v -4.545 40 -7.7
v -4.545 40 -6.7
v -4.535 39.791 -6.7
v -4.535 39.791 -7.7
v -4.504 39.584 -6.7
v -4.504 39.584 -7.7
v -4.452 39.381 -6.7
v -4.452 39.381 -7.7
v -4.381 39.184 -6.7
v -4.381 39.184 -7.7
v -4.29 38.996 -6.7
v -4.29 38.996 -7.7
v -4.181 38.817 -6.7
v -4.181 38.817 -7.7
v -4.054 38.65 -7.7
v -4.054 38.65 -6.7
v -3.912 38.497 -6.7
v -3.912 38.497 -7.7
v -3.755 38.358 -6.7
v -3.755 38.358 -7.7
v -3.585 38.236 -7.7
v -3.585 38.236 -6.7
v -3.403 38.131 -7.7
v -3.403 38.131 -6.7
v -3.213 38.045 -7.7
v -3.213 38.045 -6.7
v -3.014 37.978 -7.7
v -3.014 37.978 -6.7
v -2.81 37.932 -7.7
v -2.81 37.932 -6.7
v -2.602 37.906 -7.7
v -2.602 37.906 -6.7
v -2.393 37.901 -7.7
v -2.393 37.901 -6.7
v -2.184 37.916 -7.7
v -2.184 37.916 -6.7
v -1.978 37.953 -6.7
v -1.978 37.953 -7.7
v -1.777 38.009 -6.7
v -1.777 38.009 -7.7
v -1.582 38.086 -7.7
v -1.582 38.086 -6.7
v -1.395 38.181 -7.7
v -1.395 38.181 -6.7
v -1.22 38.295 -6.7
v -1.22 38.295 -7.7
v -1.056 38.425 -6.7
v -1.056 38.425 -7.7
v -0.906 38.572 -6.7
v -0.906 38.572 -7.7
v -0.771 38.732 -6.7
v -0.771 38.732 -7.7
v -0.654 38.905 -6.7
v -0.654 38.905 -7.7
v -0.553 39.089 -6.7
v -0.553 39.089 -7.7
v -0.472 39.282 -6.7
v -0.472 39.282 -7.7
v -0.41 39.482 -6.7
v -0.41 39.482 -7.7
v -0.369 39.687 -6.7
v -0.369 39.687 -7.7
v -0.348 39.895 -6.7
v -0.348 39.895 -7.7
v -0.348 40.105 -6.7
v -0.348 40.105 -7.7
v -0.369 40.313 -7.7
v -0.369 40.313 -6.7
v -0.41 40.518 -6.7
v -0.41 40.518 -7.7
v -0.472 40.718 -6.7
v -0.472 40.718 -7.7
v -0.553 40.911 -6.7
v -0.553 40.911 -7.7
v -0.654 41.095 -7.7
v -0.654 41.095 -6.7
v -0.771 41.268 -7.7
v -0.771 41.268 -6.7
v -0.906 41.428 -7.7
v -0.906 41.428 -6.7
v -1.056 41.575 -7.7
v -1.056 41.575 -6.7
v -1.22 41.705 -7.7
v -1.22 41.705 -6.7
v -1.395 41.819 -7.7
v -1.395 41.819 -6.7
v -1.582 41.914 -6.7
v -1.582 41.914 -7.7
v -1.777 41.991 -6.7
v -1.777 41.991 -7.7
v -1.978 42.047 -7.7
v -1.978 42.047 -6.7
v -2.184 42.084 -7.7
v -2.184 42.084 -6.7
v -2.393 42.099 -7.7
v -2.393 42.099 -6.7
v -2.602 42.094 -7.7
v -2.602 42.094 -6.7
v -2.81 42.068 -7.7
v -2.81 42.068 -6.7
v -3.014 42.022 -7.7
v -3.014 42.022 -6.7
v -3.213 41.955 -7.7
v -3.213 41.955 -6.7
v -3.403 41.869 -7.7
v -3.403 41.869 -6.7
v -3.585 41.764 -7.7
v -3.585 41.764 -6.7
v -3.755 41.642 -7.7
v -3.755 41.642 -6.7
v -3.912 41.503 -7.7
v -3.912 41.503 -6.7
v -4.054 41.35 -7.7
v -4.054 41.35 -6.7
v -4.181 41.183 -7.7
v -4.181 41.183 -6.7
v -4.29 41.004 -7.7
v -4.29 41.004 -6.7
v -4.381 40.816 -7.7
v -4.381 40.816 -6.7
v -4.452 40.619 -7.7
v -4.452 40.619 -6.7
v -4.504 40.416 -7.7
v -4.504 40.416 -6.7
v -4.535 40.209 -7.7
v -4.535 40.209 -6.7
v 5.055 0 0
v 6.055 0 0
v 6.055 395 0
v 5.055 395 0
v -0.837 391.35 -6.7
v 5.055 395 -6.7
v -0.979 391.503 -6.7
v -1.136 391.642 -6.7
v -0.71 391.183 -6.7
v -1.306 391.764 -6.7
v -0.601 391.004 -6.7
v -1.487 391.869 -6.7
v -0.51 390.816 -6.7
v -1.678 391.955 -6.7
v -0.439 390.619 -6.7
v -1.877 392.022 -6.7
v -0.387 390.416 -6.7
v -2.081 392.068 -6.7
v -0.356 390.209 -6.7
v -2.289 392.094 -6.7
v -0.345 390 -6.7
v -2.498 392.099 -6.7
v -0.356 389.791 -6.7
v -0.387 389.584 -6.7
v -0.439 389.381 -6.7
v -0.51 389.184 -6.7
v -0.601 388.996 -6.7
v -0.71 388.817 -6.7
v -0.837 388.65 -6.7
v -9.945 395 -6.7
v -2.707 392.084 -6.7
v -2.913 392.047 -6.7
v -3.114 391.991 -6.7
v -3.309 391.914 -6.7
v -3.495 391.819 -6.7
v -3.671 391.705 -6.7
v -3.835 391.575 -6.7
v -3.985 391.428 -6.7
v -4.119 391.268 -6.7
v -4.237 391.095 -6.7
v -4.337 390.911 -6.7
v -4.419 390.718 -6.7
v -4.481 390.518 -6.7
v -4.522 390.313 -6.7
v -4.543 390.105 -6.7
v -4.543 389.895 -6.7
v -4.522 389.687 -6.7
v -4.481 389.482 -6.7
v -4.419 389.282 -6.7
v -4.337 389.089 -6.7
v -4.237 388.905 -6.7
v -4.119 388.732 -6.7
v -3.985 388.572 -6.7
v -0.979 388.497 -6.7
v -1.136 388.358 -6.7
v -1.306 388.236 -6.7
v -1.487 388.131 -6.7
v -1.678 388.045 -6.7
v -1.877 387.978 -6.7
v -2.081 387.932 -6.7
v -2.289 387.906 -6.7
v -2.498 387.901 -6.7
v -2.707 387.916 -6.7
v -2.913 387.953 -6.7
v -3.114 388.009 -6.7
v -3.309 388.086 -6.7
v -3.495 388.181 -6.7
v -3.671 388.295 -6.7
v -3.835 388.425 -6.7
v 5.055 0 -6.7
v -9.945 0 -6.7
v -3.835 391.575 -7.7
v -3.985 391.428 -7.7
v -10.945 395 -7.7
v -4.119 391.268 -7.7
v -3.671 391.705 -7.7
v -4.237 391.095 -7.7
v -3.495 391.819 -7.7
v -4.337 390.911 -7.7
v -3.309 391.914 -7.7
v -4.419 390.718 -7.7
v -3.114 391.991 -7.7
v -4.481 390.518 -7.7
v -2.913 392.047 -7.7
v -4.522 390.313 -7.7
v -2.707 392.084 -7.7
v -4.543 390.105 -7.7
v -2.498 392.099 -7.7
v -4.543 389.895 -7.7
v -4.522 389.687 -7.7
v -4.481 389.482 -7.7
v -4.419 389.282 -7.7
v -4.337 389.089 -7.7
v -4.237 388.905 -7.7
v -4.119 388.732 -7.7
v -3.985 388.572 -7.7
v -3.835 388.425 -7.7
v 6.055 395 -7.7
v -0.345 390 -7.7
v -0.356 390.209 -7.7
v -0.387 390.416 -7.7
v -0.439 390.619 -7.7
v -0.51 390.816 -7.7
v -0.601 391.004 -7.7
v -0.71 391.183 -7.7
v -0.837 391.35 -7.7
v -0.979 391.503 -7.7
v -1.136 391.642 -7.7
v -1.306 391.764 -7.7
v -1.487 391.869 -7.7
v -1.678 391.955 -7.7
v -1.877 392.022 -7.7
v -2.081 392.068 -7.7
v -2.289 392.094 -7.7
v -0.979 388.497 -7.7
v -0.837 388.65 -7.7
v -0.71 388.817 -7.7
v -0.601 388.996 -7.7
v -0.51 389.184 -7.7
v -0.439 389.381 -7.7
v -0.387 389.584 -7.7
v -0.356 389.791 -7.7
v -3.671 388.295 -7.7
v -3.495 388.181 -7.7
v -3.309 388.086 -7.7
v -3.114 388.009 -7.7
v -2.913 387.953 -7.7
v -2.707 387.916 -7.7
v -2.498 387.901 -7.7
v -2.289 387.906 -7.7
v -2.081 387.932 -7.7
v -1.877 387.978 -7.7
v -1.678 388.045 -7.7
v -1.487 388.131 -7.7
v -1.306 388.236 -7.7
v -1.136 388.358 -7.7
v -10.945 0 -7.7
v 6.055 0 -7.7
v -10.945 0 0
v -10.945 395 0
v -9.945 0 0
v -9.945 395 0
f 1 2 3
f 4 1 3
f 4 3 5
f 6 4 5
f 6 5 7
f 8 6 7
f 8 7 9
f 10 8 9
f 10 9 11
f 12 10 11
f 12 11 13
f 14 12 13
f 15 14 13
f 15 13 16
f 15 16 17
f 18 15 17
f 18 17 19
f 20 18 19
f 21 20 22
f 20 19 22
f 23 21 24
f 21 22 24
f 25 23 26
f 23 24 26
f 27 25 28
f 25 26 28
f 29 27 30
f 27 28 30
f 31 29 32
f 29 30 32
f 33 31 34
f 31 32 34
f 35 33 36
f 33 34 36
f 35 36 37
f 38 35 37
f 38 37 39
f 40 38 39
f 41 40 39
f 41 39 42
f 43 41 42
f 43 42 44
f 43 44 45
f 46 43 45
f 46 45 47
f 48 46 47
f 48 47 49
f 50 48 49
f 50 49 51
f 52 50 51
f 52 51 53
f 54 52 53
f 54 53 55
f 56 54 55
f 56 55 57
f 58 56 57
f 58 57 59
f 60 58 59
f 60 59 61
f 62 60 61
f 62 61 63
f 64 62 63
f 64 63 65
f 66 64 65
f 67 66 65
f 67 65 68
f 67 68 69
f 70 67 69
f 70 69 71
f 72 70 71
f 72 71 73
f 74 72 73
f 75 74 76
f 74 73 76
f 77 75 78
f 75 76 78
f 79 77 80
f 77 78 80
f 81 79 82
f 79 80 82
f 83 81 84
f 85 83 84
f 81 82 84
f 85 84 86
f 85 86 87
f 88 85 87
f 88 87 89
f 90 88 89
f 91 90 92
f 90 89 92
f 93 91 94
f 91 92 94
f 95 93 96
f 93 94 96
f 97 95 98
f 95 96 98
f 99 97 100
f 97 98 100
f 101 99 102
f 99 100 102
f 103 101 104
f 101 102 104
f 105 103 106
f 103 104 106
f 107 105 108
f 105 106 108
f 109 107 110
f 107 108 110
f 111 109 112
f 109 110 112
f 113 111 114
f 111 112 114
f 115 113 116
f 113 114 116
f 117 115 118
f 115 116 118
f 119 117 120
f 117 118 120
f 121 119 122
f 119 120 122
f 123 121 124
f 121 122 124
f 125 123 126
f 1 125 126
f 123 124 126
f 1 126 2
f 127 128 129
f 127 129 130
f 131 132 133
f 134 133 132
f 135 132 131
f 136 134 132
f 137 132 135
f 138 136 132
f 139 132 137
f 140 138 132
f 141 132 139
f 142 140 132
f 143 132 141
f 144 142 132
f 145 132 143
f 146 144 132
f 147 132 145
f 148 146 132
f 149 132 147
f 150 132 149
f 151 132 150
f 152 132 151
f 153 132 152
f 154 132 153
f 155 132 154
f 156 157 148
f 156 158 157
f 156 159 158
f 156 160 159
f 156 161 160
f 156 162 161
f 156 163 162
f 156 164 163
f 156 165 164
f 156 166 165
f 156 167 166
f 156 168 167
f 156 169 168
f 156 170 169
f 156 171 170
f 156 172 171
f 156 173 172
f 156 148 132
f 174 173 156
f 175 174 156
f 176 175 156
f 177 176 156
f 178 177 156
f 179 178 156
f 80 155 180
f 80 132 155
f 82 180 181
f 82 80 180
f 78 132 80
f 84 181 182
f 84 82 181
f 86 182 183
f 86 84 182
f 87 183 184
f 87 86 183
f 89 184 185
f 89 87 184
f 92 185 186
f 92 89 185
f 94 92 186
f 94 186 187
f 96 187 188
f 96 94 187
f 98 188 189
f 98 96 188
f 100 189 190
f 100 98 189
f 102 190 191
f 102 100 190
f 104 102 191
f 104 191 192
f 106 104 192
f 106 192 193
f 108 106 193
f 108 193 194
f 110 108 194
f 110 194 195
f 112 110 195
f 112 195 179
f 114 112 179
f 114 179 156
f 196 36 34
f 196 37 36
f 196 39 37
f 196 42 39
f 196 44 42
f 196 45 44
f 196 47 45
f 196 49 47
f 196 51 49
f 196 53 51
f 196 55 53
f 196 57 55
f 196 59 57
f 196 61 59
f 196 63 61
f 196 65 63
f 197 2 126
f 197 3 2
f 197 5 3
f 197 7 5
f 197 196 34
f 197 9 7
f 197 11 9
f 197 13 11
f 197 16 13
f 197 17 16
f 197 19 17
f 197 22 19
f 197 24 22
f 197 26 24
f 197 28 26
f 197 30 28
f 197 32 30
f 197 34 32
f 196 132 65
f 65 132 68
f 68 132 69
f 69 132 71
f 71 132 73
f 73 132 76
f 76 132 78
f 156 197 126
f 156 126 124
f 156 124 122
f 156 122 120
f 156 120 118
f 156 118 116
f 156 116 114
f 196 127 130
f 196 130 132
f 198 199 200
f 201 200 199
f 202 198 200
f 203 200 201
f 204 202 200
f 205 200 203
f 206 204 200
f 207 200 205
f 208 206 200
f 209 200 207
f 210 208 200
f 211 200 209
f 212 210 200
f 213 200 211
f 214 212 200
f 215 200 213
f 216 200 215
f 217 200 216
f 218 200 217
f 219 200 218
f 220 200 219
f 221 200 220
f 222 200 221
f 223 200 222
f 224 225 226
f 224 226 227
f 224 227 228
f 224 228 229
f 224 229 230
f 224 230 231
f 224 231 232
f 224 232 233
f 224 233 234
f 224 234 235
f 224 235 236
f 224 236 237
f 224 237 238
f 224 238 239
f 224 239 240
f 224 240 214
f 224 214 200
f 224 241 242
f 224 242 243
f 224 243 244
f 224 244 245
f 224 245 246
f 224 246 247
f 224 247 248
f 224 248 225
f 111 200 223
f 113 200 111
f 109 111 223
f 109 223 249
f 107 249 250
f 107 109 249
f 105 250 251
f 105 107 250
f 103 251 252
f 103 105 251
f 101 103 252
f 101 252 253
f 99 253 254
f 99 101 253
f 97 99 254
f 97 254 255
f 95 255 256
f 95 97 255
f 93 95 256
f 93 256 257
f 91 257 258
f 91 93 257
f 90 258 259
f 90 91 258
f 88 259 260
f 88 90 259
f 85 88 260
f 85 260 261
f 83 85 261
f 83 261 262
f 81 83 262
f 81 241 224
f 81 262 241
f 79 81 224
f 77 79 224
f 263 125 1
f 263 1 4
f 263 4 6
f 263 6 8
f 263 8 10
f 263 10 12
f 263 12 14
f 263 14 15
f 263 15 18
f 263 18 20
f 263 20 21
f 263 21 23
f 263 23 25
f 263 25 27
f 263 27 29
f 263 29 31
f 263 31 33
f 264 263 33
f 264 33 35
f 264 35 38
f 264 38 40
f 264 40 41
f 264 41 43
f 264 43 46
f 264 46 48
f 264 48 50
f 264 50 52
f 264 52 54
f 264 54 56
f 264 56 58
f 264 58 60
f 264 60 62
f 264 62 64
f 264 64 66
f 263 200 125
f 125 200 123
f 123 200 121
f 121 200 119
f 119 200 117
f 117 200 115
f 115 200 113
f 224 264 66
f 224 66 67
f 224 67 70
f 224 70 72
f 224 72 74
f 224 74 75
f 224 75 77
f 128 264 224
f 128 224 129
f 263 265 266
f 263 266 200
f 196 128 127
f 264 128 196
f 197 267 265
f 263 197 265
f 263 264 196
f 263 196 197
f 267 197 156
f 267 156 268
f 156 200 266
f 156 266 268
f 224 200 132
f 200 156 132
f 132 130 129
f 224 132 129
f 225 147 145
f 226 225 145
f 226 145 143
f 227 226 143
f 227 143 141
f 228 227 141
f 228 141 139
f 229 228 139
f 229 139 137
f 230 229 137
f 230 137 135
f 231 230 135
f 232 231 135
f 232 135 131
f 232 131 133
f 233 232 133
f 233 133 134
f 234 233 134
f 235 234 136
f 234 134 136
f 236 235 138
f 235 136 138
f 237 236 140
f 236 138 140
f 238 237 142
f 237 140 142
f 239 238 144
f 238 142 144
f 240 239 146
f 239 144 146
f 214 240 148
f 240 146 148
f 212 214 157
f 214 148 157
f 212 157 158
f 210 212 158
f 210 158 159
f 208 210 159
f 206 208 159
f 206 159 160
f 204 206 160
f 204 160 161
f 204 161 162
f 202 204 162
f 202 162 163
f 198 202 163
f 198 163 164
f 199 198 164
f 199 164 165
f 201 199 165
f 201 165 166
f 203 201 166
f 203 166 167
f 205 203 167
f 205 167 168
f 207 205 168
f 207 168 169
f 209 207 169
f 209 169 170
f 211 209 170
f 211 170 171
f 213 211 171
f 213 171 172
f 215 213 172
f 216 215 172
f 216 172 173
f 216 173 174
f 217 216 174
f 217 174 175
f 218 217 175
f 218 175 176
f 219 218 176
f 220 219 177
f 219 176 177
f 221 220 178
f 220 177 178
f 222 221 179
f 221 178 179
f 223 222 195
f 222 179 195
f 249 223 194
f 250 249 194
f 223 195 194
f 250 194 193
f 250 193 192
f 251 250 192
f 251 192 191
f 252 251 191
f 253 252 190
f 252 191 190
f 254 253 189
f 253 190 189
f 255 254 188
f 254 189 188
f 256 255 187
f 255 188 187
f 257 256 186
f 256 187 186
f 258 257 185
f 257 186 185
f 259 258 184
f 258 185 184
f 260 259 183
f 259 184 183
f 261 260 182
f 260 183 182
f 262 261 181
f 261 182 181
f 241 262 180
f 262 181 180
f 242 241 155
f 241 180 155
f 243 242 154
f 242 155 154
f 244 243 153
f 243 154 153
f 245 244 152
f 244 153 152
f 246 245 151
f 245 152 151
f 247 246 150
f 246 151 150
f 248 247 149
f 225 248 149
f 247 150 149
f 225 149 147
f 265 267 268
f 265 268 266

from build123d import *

# Parameters (mm, degrees)
EXTRUDE_THIN1_DEPTH = 430
SKETCH2_R           = 2.1
CUT_EXTRUDE1_DEPTH  = 10
SKETCH3_W           = 27.877816903
SKETCH3_H           = 42.526750181
CUT_EXTRUDE2_DEPTH  = 10


with BuildPart() as part:
    # Sketch1 → Extrude-Thin1 (new body)
    with BuildSketch(Plane(origin=(0, 0, 0), x_dir=(1, 0, 0), z_dir=(0, 1, 0))):
        Polygon((-10.945454545, 0), (-10.945454545, 7.7), (6.054545455, 7.7), (6.054545455, 0), (5.054545455, 0), (5.054545455, 6.7), (-9.945454545, 6.7), (-9.945454545, 0), align=None)
    extrude(amount=EXTRUDE_THIN1_DEPTH)

    # Sketch2 → Cut-Extrude1 (cut)
    with BuildSketch(Plane.XY.offset(-6.7)):
        with Locations((-2.445454545, 390)):
            Circle(SKETCH2_R)
        with Locations(Location((-2.445454545, 40, 0), (0, 0, 180))):
            Circle(SKETCH2_R)
    extrude(amount=-CUT_EXTRUDE1_DEPTH, mode=Mode.SUBTRACT)

    # Sketch3 → Cut-Extrude2 (cut)
    with BuildSketch(Plane.XY):
        with Locations((-4.854182527, 416.263375091)):
            Rectangle(SKETCH3_W, SKETCH3_H)
    extrude(amount=-CUT_EXTRUDE2_DEPTH, mode=Mode.SUBTRACT)


solid = part.part
